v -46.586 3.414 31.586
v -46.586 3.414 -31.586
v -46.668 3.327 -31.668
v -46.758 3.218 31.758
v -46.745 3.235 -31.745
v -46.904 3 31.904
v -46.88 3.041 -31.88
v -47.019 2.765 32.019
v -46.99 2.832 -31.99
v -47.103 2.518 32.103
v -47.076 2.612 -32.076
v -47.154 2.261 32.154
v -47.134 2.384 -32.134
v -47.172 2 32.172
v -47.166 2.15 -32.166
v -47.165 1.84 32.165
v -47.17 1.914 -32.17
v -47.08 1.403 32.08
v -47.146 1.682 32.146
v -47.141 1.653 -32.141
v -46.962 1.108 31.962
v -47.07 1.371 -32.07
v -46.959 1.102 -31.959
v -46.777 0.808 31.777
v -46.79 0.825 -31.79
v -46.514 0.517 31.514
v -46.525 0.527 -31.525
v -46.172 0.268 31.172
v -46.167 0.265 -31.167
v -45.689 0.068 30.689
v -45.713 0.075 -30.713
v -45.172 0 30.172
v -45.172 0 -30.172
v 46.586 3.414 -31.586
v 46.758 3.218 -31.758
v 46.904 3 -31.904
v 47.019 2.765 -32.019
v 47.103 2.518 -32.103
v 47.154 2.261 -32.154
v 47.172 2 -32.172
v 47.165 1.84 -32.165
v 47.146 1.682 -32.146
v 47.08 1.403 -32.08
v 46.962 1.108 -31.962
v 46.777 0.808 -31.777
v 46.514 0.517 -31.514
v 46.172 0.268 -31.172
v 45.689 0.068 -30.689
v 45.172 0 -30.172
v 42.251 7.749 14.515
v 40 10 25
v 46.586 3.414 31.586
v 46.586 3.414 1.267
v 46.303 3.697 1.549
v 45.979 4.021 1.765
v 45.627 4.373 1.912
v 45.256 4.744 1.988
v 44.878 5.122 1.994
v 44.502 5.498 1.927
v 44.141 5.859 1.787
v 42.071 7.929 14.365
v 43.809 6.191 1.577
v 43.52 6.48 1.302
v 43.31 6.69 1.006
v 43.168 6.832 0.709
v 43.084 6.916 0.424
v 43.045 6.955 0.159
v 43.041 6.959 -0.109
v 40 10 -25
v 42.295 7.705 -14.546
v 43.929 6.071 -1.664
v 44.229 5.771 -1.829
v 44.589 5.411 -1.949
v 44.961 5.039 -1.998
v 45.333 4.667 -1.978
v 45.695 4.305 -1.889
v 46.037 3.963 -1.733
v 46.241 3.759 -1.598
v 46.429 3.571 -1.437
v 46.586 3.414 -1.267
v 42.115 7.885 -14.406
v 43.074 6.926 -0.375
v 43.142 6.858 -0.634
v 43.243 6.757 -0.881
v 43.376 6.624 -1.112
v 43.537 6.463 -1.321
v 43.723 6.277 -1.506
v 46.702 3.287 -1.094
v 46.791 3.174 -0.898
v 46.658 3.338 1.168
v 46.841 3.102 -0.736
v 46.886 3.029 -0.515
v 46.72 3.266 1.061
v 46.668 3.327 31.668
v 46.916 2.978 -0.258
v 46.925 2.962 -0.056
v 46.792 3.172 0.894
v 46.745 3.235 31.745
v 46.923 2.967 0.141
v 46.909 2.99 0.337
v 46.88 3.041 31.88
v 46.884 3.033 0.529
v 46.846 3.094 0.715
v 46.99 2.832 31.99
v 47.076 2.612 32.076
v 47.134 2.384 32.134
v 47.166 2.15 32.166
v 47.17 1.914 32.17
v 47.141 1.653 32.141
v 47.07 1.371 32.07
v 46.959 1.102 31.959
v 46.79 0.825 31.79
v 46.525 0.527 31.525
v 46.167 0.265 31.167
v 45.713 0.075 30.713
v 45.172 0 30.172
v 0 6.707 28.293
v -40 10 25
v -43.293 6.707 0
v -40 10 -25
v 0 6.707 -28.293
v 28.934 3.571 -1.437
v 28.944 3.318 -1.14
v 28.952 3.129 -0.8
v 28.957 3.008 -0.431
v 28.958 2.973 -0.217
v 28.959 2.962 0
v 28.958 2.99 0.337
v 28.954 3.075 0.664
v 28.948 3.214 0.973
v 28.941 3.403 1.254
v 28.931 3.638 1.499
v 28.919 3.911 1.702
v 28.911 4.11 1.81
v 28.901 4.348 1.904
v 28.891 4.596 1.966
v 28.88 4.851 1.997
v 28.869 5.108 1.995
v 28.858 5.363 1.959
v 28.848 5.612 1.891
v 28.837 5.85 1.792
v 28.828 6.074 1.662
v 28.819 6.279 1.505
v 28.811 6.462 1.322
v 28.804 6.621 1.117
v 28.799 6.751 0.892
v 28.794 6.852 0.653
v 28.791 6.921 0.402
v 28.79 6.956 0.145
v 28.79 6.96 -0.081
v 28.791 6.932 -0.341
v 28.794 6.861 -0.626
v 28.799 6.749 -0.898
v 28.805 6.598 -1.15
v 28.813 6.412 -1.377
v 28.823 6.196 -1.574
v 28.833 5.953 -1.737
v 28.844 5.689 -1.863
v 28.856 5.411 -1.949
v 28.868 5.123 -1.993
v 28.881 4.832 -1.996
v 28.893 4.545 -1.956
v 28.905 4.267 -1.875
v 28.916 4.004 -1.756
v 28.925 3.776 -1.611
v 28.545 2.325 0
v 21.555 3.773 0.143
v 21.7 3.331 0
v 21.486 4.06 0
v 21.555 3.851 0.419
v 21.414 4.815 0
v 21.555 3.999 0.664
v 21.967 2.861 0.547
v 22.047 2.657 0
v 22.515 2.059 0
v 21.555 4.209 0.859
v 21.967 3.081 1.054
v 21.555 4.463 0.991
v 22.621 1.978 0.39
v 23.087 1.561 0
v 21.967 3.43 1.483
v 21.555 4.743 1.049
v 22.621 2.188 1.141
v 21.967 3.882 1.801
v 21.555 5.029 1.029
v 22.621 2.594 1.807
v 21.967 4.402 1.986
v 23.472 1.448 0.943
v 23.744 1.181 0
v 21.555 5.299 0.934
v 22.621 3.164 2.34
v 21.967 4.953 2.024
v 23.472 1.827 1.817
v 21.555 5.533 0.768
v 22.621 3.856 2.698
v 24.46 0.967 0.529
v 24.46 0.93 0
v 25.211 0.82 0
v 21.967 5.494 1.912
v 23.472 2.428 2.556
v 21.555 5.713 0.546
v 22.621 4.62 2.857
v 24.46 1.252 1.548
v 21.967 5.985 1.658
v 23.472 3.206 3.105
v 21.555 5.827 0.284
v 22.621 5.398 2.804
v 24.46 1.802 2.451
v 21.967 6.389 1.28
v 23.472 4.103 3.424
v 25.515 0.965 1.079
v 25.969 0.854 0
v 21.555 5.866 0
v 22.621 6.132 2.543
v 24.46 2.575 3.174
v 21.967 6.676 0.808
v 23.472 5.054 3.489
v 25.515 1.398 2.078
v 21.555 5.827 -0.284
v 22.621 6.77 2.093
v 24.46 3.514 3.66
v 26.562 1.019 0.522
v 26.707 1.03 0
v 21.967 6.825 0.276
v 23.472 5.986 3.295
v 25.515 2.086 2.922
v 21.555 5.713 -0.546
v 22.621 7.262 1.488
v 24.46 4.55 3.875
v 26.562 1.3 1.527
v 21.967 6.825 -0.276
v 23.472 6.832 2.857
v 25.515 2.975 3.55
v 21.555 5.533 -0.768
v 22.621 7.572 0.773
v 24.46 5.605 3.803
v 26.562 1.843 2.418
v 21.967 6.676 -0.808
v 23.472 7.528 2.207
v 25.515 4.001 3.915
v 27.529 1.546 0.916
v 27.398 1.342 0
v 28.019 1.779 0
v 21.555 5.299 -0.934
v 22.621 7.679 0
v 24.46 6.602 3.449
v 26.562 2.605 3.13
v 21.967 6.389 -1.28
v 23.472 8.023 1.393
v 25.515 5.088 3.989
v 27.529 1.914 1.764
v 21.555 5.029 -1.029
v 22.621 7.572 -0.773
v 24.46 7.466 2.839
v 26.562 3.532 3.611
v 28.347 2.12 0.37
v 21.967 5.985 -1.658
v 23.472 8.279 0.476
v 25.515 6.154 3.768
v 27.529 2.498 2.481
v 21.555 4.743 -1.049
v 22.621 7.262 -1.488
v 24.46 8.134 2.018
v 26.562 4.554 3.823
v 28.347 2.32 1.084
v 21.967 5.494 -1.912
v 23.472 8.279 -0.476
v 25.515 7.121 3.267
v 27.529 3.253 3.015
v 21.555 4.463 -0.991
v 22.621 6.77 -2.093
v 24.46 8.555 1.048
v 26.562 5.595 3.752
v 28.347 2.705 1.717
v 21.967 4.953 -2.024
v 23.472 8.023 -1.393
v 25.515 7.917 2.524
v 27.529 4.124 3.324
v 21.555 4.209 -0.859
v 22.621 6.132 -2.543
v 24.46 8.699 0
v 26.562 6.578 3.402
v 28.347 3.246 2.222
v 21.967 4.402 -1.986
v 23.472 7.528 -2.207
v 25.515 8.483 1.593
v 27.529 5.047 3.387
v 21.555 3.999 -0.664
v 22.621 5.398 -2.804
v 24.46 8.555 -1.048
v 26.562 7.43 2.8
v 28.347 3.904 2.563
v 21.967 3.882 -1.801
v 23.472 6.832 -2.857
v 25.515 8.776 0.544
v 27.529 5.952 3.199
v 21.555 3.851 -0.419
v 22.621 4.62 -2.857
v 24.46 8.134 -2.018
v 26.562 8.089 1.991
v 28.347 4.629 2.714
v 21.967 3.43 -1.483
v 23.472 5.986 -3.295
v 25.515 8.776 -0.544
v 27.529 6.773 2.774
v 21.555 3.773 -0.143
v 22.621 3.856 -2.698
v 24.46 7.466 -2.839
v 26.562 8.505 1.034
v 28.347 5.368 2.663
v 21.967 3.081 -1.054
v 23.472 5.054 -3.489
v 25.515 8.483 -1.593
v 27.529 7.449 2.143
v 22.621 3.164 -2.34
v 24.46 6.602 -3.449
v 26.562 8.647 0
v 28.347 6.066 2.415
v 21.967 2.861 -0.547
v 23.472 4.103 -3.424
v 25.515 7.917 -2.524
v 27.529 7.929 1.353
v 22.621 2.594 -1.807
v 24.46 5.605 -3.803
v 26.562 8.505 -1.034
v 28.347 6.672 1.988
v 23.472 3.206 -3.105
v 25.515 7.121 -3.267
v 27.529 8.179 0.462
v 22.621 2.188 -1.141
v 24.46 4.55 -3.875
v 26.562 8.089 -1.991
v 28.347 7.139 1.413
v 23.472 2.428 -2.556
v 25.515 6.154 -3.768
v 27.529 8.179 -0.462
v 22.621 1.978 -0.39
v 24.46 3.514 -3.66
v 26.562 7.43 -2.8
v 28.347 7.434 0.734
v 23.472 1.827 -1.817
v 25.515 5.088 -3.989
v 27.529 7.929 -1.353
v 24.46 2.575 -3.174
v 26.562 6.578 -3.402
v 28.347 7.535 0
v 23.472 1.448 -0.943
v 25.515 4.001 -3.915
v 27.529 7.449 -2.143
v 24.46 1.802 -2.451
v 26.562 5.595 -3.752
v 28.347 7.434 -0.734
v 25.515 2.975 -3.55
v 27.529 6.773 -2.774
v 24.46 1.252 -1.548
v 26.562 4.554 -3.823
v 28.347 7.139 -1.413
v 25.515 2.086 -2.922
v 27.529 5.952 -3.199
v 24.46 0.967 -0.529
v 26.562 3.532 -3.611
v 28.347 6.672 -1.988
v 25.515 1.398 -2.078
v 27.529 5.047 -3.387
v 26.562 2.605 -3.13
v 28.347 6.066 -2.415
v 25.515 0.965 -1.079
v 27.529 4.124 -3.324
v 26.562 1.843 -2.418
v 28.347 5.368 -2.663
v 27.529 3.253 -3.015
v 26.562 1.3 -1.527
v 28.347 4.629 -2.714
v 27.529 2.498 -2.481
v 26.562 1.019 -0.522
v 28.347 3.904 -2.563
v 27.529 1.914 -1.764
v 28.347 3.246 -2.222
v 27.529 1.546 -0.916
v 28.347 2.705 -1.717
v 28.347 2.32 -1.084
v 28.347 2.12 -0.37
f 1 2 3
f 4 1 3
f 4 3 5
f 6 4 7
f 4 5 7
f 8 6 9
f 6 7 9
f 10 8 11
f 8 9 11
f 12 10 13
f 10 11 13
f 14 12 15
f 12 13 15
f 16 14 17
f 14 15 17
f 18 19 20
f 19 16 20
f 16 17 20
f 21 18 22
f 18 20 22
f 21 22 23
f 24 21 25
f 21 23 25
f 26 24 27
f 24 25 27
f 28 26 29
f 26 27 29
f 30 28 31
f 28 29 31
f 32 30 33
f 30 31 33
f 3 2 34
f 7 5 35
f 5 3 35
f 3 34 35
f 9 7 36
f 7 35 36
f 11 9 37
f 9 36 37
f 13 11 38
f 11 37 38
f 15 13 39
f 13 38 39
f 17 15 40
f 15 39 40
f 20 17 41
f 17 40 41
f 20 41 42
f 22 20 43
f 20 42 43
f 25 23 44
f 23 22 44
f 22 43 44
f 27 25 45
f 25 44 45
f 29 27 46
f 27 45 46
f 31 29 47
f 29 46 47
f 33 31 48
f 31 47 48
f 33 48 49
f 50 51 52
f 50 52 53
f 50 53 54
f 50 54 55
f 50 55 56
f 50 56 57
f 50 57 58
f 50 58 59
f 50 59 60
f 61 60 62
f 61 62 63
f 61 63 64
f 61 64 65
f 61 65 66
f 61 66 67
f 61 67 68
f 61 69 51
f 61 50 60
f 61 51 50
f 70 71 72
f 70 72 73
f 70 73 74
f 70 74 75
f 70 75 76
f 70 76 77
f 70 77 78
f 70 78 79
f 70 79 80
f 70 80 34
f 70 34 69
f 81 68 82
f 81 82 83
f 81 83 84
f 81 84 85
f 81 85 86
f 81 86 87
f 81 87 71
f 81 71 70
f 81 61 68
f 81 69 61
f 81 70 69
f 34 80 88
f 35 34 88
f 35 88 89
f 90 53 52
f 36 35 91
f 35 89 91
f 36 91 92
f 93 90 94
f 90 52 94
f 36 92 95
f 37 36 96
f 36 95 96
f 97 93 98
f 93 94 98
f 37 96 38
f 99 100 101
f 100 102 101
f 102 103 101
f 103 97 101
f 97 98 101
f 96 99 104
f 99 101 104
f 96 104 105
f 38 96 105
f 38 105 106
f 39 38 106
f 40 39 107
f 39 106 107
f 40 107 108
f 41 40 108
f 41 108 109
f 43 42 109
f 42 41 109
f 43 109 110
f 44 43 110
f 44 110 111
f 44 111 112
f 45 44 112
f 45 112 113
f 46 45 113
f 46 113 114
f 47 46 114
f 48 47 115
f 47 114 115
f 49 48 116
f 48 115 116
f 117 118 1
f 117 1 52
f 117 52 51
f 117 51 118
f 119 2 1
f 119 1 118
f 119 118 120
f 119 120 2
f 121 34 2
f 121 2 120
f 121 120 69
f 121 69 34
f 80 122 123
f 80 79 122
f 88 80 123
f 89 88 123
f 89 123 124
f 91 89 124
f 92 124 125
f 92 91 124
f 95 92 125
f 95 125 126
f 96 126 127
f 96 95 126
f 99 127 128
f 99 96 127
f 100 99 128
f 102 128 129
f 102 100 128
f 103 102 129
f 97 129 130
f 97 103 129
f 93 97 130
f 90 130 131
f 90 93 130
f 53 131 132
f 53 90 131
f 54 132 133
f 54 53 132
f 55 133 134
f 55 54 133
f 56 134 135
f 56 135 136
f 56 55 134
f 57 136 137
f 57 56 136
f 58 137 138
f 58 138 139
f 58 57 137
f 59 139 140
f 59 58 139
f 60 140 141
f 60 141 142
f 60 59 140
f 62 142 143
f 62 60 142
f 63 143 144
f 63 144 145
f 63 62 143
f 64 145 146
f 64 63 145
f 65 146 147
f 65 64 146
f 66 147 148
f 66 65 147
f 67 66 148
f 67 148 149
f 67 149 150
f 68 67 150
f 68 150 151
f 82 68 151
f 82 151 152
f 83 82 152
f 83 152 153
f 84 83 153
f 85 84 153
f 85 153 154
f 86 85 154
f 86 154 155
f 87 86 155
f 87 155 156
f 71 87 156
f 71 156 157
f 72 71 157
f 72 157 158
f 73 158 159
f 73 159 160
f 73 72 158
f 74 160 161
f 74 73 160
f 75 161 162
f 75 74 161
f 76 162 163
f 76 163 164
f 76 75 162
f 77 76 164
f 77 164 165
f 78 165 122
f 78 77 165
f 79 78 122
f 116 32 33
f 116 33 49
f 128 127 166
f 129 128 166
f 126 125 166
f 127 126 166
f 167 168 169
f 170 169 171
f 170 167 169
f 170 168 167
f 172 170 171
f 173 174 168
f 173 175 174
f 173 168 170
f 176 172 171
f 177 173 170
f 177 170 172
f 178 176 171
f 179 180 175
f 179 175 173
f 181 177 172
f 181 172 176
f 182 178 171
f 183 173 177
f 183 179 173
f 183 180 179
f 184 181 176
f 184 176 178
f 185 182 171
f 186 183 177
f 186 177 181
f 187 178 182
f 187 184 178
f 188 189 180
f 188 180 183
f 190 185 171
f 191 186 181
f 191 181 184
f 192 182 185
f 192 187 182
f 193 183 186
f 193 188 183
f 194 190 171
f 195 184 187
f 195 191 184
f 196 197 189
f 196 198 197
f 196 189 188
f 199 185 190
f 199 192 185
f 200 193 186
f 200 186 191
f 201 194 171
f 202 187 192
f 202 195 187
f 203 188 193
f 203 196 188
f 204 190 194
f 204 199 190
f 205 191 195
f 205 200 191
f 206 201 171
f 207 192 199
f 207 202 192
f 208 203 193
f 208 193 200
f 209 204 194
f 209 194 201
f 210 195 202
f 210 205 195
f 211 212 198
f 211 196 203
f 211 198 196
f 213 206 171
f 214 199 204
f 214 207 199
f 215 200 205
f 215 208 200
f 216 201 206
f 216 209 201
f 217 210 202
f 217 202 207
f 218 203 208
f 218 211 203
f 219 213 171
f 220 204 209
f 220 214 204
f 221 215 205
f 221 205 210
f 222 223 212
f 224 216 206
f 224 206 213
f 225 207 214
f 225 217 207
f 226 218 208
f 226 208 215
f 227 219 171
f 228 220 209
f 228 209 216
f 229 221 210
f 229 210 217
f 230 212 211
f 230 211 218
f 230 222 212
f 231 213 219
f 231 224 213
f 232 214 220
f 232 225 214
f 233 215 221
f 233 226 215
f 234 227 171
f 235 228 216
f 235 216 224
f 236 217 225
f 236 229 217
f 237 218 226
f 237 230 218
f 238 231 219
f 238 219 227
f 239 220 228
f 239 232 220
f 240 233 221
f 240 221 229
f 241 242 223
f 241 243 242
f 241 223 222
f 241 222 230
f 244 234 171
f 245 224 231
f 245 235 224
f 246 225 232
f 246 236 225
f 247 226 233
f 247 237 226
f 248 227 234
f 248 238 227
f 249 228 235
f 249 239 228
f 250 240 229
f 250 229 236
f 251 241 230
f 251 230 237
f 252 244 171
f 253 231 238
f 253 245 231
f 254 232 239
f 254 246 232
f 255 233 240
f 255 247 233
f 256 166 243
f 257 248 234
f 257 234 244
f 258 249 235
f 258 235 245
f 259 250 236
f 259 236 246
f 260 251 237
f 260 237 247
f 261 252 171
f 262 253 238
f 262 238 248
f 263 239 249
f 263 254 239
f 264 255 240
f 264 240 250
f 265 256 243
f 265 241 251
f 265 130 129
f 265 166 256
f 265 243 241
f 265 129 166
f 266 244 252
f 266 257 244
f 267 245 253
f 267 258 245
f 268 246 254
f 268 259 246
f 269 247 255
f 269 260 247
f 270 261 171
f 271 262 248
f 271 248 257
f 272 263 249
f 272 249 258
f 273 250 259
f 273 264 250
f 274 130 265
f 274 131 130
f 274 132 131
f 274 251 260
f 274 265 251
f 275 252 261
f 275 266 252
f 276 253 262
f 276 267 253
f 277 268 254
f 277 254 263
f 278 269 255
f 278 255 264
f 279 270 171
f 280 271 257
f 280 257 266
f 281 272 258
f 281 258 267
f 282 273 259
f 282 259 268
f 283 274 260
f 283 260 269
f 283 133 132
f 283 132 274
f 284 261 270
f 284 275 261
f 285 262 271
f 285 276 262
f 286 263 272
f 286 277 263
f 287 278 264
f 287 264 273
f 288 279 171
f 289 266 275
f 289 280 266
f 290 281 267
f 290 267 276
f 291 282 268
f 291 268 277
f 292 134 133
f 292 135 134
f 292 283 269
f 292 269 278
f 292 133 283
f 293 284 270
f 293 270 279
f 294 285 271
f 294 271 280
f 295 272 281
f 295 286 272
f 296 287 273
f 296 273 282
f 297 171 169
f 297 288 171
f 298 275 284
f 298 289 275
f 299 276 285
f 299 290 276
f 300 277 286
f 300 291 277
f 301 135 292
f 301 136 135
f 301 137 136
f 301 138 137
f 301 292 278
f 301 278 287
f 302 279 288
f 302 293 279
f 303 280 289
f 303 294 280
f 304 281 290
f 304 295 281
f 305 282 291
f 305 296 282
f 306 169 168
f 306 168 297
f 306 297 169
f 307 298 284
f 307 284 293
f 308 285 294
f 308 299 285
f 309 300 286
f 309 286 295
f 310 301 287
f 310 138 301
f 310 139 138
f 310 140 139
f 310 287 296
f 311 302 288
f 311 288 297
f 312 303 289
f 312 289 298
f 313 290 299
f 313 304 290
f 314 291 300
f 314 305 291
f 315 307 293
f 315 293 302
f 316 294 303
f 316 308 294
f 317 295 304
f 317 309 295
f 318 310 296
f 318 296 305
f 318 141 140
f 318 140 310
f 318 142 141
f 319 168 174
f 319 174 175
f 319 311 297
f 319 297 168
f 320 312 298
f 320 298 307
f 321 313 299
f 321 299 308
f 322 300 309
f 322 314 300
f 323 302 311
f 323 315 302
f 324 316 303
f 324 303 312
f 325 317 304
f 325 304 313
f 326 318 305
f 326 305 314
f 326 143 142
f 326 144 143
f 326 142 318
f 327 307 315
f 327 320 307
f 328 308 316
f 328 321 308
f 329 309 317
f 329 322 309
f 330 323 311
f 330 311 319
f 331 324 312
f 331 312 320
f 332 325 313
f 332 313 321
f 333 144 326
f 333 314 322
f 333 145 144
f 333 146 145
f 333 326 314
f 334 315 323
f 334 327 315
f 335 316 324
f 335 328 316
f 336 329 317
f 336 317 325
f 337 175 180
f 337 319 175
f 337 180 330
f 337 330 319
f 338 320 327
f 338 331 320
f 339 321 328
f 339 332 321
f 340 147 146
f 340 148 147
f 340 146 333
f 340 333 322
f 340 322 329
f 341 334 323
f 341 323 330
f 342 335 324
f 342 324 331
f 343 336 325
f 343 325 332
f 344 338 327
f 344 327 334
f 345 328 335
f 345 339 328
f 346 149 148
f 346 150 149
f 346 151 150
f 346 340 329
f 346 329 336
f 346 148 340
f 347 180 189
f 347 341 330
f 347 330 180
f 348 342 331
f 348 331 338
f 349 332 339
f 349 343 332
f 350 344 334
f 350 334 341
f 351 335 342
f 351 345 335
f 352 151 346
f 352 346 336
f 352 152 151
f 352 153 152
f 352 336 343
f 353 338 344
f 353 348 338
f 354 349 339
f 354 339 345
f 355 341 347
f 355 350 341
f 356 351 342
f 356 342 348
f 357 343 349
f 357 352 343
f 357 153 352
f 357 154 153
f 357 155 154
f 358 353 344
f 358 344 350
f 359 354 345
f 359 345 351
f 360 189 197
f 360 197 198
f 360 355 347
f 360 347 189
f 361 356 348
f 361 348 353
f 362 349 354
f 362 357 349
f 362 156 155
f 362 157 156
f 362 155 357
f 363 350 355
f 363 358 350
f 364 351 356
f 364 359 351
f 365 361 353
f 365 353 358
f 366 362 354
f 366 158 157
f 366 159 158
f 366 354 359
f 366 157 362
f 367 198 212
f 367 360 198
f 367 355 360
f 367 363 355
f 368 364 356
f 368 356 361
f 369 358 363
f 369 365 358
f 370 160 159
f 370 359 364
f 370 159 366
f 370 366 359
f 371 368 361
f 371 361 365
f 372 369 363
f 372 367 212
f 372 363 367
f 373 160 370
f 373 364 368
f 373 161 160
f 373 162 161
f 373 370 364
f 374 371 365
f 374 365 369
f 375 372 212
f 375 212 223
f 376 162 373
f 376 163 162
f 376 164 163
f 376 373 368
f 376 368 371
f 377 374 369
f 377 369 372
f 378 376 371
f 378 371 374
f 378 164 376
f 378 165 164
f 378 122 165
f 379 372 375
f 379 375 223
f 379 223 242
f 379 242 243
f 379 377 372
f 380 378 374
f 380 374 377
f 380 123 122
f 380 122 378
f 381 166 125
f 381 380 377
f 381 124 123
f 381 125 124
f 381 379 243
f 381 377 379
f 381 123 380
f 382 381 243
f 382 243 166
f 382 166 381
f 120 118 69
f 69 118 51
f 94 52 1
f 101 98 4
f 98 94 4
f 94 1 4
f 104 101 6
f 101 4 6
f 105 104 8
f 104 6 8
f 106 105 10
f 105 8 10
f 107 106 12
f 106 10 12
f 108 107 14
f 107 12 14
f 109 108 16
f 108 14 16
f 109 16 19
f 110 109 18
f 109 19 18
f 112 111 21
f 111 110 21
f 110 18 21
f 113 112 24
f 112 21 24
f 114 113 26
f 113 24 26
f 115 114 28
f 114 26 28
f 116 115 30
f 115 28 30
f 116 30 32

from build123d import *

# Parameters (mm, degrees)
SKETCH_1_W      = 100
SKETCH_1_H      = 70
EXTRUDE_1_DEPTH = 10
EXTRUDE_1_TAPER = 45
SKETCH_5_W      = 28.87382981
SKETCH_5_H      = 2
FILLET_1_R      = 2


with BuildPart() as part:
    # 草图1 → 凸台-拉伸1 (new body)
    with BuildSketch(Plane(origin=(0, 0, 0), x_dir=(1, 0, 0), z_dir=(0, 1, 0))):
        Rectangle(SKETCH_1_W, SKETCH_1_H)
    extrude(amount=EXTRUDE_1_DEPTH, taper=EXTRUDE_1_TAPER)

    # 草图2 one side → 切除-旋转2 (revolve, cut)
    with BuildSketch(Plane.XY):
        with BuildLine():
            ThreePointArc((21.414207954, 4.814992755), (25.414207954, 0.814992755), (29.414207954, 4.814992755))
            Line((29.414207954, 4.814992755), (21.414207954, 4.814992755))
        make_face()
    revolve(axis=Axis((65.414207954, 4.814992755, 0), (-1, 0, 0)), mode=Mode.SUBTRACT)

    # 草图5 → 切除-旋转4 (revolve, cut)
    with BuildSketch(Plane.XY, mode=Mode.PRIVATE) as cut_revolve_4_sk:
        with Locations((40.362985489, 5.961536801)):
            Rectangle(SKETCH_5_W, SKETCH_5_H)
    revolve(cut_revolve_4_sk.sketch.rotate(Axis((54.799900394, 4.961536801, 0), (-1, 0, 0)), 134.067661737), axis=Axis((54.799900394, 4.961536801, 0), (-1, 0, 0)), mode=Mode.SUBTRACT)

    # 圆角1
    # the kernel refuses this fillet: 2 mm, written as the material it takes off along each edge
    with BuildSketch(Plane(origin=(-62.071067812, 0, 35), x_dir=(0, 0.7071067811865464, -0.7071067811865487), z_dir=(1, 0, 0)), Plane(origin=(62.071067812, 0, -35), x_dir=(0, 0.7071067811865461, 0.707106781186549), z_dir=(-1, 0, 0))) as fillet_1_piece_1:
        with BuildLine():
            CenterArc((FILLET_1_R * 2.41421356237, -FILLET_1_R), FILLET_1_R, 90, 135)
            Line((FILLET_1_R * 1.70710678119, -FILLET_1_R * 1.70710678119), (0, 0))
            Line((0, 0), (FILLET_1_R * 2.41421356237, 0))
        make_face()
    extrude(amount=124.142135624, mode=Mode.SUBTRACT)
    with BuildSketch(Plane(origin=(-50, 0, -47.071067812), x_dir=(0.7071067811865483, 0.7071067811865466, 0), z_dir=(0, 0, 1)), Plane(origin=(50, 0, 47.071067812), x_dir=(-0.7071067811865485, 0.7071067811865467, 0), z_dir=(0, 0, -1))) as fillet_1_piece_2:
        with BuildLine():
            CenterArc((FILLET_1_R * 2.41421356237, -FILLET_1_R), FILLET_1_R, 90, 135)
            Line((FILLET_1_R * 1.70710678119, -FILLET_1_R * 1.70710678119), (0, 0))
            Line((0, 0), (FILLET_1_R * 2.41421356237, 0))
        make_face()
    extrude(amount=94.142135624, mode=Mode.SUBTRACT)


solid = part.part
